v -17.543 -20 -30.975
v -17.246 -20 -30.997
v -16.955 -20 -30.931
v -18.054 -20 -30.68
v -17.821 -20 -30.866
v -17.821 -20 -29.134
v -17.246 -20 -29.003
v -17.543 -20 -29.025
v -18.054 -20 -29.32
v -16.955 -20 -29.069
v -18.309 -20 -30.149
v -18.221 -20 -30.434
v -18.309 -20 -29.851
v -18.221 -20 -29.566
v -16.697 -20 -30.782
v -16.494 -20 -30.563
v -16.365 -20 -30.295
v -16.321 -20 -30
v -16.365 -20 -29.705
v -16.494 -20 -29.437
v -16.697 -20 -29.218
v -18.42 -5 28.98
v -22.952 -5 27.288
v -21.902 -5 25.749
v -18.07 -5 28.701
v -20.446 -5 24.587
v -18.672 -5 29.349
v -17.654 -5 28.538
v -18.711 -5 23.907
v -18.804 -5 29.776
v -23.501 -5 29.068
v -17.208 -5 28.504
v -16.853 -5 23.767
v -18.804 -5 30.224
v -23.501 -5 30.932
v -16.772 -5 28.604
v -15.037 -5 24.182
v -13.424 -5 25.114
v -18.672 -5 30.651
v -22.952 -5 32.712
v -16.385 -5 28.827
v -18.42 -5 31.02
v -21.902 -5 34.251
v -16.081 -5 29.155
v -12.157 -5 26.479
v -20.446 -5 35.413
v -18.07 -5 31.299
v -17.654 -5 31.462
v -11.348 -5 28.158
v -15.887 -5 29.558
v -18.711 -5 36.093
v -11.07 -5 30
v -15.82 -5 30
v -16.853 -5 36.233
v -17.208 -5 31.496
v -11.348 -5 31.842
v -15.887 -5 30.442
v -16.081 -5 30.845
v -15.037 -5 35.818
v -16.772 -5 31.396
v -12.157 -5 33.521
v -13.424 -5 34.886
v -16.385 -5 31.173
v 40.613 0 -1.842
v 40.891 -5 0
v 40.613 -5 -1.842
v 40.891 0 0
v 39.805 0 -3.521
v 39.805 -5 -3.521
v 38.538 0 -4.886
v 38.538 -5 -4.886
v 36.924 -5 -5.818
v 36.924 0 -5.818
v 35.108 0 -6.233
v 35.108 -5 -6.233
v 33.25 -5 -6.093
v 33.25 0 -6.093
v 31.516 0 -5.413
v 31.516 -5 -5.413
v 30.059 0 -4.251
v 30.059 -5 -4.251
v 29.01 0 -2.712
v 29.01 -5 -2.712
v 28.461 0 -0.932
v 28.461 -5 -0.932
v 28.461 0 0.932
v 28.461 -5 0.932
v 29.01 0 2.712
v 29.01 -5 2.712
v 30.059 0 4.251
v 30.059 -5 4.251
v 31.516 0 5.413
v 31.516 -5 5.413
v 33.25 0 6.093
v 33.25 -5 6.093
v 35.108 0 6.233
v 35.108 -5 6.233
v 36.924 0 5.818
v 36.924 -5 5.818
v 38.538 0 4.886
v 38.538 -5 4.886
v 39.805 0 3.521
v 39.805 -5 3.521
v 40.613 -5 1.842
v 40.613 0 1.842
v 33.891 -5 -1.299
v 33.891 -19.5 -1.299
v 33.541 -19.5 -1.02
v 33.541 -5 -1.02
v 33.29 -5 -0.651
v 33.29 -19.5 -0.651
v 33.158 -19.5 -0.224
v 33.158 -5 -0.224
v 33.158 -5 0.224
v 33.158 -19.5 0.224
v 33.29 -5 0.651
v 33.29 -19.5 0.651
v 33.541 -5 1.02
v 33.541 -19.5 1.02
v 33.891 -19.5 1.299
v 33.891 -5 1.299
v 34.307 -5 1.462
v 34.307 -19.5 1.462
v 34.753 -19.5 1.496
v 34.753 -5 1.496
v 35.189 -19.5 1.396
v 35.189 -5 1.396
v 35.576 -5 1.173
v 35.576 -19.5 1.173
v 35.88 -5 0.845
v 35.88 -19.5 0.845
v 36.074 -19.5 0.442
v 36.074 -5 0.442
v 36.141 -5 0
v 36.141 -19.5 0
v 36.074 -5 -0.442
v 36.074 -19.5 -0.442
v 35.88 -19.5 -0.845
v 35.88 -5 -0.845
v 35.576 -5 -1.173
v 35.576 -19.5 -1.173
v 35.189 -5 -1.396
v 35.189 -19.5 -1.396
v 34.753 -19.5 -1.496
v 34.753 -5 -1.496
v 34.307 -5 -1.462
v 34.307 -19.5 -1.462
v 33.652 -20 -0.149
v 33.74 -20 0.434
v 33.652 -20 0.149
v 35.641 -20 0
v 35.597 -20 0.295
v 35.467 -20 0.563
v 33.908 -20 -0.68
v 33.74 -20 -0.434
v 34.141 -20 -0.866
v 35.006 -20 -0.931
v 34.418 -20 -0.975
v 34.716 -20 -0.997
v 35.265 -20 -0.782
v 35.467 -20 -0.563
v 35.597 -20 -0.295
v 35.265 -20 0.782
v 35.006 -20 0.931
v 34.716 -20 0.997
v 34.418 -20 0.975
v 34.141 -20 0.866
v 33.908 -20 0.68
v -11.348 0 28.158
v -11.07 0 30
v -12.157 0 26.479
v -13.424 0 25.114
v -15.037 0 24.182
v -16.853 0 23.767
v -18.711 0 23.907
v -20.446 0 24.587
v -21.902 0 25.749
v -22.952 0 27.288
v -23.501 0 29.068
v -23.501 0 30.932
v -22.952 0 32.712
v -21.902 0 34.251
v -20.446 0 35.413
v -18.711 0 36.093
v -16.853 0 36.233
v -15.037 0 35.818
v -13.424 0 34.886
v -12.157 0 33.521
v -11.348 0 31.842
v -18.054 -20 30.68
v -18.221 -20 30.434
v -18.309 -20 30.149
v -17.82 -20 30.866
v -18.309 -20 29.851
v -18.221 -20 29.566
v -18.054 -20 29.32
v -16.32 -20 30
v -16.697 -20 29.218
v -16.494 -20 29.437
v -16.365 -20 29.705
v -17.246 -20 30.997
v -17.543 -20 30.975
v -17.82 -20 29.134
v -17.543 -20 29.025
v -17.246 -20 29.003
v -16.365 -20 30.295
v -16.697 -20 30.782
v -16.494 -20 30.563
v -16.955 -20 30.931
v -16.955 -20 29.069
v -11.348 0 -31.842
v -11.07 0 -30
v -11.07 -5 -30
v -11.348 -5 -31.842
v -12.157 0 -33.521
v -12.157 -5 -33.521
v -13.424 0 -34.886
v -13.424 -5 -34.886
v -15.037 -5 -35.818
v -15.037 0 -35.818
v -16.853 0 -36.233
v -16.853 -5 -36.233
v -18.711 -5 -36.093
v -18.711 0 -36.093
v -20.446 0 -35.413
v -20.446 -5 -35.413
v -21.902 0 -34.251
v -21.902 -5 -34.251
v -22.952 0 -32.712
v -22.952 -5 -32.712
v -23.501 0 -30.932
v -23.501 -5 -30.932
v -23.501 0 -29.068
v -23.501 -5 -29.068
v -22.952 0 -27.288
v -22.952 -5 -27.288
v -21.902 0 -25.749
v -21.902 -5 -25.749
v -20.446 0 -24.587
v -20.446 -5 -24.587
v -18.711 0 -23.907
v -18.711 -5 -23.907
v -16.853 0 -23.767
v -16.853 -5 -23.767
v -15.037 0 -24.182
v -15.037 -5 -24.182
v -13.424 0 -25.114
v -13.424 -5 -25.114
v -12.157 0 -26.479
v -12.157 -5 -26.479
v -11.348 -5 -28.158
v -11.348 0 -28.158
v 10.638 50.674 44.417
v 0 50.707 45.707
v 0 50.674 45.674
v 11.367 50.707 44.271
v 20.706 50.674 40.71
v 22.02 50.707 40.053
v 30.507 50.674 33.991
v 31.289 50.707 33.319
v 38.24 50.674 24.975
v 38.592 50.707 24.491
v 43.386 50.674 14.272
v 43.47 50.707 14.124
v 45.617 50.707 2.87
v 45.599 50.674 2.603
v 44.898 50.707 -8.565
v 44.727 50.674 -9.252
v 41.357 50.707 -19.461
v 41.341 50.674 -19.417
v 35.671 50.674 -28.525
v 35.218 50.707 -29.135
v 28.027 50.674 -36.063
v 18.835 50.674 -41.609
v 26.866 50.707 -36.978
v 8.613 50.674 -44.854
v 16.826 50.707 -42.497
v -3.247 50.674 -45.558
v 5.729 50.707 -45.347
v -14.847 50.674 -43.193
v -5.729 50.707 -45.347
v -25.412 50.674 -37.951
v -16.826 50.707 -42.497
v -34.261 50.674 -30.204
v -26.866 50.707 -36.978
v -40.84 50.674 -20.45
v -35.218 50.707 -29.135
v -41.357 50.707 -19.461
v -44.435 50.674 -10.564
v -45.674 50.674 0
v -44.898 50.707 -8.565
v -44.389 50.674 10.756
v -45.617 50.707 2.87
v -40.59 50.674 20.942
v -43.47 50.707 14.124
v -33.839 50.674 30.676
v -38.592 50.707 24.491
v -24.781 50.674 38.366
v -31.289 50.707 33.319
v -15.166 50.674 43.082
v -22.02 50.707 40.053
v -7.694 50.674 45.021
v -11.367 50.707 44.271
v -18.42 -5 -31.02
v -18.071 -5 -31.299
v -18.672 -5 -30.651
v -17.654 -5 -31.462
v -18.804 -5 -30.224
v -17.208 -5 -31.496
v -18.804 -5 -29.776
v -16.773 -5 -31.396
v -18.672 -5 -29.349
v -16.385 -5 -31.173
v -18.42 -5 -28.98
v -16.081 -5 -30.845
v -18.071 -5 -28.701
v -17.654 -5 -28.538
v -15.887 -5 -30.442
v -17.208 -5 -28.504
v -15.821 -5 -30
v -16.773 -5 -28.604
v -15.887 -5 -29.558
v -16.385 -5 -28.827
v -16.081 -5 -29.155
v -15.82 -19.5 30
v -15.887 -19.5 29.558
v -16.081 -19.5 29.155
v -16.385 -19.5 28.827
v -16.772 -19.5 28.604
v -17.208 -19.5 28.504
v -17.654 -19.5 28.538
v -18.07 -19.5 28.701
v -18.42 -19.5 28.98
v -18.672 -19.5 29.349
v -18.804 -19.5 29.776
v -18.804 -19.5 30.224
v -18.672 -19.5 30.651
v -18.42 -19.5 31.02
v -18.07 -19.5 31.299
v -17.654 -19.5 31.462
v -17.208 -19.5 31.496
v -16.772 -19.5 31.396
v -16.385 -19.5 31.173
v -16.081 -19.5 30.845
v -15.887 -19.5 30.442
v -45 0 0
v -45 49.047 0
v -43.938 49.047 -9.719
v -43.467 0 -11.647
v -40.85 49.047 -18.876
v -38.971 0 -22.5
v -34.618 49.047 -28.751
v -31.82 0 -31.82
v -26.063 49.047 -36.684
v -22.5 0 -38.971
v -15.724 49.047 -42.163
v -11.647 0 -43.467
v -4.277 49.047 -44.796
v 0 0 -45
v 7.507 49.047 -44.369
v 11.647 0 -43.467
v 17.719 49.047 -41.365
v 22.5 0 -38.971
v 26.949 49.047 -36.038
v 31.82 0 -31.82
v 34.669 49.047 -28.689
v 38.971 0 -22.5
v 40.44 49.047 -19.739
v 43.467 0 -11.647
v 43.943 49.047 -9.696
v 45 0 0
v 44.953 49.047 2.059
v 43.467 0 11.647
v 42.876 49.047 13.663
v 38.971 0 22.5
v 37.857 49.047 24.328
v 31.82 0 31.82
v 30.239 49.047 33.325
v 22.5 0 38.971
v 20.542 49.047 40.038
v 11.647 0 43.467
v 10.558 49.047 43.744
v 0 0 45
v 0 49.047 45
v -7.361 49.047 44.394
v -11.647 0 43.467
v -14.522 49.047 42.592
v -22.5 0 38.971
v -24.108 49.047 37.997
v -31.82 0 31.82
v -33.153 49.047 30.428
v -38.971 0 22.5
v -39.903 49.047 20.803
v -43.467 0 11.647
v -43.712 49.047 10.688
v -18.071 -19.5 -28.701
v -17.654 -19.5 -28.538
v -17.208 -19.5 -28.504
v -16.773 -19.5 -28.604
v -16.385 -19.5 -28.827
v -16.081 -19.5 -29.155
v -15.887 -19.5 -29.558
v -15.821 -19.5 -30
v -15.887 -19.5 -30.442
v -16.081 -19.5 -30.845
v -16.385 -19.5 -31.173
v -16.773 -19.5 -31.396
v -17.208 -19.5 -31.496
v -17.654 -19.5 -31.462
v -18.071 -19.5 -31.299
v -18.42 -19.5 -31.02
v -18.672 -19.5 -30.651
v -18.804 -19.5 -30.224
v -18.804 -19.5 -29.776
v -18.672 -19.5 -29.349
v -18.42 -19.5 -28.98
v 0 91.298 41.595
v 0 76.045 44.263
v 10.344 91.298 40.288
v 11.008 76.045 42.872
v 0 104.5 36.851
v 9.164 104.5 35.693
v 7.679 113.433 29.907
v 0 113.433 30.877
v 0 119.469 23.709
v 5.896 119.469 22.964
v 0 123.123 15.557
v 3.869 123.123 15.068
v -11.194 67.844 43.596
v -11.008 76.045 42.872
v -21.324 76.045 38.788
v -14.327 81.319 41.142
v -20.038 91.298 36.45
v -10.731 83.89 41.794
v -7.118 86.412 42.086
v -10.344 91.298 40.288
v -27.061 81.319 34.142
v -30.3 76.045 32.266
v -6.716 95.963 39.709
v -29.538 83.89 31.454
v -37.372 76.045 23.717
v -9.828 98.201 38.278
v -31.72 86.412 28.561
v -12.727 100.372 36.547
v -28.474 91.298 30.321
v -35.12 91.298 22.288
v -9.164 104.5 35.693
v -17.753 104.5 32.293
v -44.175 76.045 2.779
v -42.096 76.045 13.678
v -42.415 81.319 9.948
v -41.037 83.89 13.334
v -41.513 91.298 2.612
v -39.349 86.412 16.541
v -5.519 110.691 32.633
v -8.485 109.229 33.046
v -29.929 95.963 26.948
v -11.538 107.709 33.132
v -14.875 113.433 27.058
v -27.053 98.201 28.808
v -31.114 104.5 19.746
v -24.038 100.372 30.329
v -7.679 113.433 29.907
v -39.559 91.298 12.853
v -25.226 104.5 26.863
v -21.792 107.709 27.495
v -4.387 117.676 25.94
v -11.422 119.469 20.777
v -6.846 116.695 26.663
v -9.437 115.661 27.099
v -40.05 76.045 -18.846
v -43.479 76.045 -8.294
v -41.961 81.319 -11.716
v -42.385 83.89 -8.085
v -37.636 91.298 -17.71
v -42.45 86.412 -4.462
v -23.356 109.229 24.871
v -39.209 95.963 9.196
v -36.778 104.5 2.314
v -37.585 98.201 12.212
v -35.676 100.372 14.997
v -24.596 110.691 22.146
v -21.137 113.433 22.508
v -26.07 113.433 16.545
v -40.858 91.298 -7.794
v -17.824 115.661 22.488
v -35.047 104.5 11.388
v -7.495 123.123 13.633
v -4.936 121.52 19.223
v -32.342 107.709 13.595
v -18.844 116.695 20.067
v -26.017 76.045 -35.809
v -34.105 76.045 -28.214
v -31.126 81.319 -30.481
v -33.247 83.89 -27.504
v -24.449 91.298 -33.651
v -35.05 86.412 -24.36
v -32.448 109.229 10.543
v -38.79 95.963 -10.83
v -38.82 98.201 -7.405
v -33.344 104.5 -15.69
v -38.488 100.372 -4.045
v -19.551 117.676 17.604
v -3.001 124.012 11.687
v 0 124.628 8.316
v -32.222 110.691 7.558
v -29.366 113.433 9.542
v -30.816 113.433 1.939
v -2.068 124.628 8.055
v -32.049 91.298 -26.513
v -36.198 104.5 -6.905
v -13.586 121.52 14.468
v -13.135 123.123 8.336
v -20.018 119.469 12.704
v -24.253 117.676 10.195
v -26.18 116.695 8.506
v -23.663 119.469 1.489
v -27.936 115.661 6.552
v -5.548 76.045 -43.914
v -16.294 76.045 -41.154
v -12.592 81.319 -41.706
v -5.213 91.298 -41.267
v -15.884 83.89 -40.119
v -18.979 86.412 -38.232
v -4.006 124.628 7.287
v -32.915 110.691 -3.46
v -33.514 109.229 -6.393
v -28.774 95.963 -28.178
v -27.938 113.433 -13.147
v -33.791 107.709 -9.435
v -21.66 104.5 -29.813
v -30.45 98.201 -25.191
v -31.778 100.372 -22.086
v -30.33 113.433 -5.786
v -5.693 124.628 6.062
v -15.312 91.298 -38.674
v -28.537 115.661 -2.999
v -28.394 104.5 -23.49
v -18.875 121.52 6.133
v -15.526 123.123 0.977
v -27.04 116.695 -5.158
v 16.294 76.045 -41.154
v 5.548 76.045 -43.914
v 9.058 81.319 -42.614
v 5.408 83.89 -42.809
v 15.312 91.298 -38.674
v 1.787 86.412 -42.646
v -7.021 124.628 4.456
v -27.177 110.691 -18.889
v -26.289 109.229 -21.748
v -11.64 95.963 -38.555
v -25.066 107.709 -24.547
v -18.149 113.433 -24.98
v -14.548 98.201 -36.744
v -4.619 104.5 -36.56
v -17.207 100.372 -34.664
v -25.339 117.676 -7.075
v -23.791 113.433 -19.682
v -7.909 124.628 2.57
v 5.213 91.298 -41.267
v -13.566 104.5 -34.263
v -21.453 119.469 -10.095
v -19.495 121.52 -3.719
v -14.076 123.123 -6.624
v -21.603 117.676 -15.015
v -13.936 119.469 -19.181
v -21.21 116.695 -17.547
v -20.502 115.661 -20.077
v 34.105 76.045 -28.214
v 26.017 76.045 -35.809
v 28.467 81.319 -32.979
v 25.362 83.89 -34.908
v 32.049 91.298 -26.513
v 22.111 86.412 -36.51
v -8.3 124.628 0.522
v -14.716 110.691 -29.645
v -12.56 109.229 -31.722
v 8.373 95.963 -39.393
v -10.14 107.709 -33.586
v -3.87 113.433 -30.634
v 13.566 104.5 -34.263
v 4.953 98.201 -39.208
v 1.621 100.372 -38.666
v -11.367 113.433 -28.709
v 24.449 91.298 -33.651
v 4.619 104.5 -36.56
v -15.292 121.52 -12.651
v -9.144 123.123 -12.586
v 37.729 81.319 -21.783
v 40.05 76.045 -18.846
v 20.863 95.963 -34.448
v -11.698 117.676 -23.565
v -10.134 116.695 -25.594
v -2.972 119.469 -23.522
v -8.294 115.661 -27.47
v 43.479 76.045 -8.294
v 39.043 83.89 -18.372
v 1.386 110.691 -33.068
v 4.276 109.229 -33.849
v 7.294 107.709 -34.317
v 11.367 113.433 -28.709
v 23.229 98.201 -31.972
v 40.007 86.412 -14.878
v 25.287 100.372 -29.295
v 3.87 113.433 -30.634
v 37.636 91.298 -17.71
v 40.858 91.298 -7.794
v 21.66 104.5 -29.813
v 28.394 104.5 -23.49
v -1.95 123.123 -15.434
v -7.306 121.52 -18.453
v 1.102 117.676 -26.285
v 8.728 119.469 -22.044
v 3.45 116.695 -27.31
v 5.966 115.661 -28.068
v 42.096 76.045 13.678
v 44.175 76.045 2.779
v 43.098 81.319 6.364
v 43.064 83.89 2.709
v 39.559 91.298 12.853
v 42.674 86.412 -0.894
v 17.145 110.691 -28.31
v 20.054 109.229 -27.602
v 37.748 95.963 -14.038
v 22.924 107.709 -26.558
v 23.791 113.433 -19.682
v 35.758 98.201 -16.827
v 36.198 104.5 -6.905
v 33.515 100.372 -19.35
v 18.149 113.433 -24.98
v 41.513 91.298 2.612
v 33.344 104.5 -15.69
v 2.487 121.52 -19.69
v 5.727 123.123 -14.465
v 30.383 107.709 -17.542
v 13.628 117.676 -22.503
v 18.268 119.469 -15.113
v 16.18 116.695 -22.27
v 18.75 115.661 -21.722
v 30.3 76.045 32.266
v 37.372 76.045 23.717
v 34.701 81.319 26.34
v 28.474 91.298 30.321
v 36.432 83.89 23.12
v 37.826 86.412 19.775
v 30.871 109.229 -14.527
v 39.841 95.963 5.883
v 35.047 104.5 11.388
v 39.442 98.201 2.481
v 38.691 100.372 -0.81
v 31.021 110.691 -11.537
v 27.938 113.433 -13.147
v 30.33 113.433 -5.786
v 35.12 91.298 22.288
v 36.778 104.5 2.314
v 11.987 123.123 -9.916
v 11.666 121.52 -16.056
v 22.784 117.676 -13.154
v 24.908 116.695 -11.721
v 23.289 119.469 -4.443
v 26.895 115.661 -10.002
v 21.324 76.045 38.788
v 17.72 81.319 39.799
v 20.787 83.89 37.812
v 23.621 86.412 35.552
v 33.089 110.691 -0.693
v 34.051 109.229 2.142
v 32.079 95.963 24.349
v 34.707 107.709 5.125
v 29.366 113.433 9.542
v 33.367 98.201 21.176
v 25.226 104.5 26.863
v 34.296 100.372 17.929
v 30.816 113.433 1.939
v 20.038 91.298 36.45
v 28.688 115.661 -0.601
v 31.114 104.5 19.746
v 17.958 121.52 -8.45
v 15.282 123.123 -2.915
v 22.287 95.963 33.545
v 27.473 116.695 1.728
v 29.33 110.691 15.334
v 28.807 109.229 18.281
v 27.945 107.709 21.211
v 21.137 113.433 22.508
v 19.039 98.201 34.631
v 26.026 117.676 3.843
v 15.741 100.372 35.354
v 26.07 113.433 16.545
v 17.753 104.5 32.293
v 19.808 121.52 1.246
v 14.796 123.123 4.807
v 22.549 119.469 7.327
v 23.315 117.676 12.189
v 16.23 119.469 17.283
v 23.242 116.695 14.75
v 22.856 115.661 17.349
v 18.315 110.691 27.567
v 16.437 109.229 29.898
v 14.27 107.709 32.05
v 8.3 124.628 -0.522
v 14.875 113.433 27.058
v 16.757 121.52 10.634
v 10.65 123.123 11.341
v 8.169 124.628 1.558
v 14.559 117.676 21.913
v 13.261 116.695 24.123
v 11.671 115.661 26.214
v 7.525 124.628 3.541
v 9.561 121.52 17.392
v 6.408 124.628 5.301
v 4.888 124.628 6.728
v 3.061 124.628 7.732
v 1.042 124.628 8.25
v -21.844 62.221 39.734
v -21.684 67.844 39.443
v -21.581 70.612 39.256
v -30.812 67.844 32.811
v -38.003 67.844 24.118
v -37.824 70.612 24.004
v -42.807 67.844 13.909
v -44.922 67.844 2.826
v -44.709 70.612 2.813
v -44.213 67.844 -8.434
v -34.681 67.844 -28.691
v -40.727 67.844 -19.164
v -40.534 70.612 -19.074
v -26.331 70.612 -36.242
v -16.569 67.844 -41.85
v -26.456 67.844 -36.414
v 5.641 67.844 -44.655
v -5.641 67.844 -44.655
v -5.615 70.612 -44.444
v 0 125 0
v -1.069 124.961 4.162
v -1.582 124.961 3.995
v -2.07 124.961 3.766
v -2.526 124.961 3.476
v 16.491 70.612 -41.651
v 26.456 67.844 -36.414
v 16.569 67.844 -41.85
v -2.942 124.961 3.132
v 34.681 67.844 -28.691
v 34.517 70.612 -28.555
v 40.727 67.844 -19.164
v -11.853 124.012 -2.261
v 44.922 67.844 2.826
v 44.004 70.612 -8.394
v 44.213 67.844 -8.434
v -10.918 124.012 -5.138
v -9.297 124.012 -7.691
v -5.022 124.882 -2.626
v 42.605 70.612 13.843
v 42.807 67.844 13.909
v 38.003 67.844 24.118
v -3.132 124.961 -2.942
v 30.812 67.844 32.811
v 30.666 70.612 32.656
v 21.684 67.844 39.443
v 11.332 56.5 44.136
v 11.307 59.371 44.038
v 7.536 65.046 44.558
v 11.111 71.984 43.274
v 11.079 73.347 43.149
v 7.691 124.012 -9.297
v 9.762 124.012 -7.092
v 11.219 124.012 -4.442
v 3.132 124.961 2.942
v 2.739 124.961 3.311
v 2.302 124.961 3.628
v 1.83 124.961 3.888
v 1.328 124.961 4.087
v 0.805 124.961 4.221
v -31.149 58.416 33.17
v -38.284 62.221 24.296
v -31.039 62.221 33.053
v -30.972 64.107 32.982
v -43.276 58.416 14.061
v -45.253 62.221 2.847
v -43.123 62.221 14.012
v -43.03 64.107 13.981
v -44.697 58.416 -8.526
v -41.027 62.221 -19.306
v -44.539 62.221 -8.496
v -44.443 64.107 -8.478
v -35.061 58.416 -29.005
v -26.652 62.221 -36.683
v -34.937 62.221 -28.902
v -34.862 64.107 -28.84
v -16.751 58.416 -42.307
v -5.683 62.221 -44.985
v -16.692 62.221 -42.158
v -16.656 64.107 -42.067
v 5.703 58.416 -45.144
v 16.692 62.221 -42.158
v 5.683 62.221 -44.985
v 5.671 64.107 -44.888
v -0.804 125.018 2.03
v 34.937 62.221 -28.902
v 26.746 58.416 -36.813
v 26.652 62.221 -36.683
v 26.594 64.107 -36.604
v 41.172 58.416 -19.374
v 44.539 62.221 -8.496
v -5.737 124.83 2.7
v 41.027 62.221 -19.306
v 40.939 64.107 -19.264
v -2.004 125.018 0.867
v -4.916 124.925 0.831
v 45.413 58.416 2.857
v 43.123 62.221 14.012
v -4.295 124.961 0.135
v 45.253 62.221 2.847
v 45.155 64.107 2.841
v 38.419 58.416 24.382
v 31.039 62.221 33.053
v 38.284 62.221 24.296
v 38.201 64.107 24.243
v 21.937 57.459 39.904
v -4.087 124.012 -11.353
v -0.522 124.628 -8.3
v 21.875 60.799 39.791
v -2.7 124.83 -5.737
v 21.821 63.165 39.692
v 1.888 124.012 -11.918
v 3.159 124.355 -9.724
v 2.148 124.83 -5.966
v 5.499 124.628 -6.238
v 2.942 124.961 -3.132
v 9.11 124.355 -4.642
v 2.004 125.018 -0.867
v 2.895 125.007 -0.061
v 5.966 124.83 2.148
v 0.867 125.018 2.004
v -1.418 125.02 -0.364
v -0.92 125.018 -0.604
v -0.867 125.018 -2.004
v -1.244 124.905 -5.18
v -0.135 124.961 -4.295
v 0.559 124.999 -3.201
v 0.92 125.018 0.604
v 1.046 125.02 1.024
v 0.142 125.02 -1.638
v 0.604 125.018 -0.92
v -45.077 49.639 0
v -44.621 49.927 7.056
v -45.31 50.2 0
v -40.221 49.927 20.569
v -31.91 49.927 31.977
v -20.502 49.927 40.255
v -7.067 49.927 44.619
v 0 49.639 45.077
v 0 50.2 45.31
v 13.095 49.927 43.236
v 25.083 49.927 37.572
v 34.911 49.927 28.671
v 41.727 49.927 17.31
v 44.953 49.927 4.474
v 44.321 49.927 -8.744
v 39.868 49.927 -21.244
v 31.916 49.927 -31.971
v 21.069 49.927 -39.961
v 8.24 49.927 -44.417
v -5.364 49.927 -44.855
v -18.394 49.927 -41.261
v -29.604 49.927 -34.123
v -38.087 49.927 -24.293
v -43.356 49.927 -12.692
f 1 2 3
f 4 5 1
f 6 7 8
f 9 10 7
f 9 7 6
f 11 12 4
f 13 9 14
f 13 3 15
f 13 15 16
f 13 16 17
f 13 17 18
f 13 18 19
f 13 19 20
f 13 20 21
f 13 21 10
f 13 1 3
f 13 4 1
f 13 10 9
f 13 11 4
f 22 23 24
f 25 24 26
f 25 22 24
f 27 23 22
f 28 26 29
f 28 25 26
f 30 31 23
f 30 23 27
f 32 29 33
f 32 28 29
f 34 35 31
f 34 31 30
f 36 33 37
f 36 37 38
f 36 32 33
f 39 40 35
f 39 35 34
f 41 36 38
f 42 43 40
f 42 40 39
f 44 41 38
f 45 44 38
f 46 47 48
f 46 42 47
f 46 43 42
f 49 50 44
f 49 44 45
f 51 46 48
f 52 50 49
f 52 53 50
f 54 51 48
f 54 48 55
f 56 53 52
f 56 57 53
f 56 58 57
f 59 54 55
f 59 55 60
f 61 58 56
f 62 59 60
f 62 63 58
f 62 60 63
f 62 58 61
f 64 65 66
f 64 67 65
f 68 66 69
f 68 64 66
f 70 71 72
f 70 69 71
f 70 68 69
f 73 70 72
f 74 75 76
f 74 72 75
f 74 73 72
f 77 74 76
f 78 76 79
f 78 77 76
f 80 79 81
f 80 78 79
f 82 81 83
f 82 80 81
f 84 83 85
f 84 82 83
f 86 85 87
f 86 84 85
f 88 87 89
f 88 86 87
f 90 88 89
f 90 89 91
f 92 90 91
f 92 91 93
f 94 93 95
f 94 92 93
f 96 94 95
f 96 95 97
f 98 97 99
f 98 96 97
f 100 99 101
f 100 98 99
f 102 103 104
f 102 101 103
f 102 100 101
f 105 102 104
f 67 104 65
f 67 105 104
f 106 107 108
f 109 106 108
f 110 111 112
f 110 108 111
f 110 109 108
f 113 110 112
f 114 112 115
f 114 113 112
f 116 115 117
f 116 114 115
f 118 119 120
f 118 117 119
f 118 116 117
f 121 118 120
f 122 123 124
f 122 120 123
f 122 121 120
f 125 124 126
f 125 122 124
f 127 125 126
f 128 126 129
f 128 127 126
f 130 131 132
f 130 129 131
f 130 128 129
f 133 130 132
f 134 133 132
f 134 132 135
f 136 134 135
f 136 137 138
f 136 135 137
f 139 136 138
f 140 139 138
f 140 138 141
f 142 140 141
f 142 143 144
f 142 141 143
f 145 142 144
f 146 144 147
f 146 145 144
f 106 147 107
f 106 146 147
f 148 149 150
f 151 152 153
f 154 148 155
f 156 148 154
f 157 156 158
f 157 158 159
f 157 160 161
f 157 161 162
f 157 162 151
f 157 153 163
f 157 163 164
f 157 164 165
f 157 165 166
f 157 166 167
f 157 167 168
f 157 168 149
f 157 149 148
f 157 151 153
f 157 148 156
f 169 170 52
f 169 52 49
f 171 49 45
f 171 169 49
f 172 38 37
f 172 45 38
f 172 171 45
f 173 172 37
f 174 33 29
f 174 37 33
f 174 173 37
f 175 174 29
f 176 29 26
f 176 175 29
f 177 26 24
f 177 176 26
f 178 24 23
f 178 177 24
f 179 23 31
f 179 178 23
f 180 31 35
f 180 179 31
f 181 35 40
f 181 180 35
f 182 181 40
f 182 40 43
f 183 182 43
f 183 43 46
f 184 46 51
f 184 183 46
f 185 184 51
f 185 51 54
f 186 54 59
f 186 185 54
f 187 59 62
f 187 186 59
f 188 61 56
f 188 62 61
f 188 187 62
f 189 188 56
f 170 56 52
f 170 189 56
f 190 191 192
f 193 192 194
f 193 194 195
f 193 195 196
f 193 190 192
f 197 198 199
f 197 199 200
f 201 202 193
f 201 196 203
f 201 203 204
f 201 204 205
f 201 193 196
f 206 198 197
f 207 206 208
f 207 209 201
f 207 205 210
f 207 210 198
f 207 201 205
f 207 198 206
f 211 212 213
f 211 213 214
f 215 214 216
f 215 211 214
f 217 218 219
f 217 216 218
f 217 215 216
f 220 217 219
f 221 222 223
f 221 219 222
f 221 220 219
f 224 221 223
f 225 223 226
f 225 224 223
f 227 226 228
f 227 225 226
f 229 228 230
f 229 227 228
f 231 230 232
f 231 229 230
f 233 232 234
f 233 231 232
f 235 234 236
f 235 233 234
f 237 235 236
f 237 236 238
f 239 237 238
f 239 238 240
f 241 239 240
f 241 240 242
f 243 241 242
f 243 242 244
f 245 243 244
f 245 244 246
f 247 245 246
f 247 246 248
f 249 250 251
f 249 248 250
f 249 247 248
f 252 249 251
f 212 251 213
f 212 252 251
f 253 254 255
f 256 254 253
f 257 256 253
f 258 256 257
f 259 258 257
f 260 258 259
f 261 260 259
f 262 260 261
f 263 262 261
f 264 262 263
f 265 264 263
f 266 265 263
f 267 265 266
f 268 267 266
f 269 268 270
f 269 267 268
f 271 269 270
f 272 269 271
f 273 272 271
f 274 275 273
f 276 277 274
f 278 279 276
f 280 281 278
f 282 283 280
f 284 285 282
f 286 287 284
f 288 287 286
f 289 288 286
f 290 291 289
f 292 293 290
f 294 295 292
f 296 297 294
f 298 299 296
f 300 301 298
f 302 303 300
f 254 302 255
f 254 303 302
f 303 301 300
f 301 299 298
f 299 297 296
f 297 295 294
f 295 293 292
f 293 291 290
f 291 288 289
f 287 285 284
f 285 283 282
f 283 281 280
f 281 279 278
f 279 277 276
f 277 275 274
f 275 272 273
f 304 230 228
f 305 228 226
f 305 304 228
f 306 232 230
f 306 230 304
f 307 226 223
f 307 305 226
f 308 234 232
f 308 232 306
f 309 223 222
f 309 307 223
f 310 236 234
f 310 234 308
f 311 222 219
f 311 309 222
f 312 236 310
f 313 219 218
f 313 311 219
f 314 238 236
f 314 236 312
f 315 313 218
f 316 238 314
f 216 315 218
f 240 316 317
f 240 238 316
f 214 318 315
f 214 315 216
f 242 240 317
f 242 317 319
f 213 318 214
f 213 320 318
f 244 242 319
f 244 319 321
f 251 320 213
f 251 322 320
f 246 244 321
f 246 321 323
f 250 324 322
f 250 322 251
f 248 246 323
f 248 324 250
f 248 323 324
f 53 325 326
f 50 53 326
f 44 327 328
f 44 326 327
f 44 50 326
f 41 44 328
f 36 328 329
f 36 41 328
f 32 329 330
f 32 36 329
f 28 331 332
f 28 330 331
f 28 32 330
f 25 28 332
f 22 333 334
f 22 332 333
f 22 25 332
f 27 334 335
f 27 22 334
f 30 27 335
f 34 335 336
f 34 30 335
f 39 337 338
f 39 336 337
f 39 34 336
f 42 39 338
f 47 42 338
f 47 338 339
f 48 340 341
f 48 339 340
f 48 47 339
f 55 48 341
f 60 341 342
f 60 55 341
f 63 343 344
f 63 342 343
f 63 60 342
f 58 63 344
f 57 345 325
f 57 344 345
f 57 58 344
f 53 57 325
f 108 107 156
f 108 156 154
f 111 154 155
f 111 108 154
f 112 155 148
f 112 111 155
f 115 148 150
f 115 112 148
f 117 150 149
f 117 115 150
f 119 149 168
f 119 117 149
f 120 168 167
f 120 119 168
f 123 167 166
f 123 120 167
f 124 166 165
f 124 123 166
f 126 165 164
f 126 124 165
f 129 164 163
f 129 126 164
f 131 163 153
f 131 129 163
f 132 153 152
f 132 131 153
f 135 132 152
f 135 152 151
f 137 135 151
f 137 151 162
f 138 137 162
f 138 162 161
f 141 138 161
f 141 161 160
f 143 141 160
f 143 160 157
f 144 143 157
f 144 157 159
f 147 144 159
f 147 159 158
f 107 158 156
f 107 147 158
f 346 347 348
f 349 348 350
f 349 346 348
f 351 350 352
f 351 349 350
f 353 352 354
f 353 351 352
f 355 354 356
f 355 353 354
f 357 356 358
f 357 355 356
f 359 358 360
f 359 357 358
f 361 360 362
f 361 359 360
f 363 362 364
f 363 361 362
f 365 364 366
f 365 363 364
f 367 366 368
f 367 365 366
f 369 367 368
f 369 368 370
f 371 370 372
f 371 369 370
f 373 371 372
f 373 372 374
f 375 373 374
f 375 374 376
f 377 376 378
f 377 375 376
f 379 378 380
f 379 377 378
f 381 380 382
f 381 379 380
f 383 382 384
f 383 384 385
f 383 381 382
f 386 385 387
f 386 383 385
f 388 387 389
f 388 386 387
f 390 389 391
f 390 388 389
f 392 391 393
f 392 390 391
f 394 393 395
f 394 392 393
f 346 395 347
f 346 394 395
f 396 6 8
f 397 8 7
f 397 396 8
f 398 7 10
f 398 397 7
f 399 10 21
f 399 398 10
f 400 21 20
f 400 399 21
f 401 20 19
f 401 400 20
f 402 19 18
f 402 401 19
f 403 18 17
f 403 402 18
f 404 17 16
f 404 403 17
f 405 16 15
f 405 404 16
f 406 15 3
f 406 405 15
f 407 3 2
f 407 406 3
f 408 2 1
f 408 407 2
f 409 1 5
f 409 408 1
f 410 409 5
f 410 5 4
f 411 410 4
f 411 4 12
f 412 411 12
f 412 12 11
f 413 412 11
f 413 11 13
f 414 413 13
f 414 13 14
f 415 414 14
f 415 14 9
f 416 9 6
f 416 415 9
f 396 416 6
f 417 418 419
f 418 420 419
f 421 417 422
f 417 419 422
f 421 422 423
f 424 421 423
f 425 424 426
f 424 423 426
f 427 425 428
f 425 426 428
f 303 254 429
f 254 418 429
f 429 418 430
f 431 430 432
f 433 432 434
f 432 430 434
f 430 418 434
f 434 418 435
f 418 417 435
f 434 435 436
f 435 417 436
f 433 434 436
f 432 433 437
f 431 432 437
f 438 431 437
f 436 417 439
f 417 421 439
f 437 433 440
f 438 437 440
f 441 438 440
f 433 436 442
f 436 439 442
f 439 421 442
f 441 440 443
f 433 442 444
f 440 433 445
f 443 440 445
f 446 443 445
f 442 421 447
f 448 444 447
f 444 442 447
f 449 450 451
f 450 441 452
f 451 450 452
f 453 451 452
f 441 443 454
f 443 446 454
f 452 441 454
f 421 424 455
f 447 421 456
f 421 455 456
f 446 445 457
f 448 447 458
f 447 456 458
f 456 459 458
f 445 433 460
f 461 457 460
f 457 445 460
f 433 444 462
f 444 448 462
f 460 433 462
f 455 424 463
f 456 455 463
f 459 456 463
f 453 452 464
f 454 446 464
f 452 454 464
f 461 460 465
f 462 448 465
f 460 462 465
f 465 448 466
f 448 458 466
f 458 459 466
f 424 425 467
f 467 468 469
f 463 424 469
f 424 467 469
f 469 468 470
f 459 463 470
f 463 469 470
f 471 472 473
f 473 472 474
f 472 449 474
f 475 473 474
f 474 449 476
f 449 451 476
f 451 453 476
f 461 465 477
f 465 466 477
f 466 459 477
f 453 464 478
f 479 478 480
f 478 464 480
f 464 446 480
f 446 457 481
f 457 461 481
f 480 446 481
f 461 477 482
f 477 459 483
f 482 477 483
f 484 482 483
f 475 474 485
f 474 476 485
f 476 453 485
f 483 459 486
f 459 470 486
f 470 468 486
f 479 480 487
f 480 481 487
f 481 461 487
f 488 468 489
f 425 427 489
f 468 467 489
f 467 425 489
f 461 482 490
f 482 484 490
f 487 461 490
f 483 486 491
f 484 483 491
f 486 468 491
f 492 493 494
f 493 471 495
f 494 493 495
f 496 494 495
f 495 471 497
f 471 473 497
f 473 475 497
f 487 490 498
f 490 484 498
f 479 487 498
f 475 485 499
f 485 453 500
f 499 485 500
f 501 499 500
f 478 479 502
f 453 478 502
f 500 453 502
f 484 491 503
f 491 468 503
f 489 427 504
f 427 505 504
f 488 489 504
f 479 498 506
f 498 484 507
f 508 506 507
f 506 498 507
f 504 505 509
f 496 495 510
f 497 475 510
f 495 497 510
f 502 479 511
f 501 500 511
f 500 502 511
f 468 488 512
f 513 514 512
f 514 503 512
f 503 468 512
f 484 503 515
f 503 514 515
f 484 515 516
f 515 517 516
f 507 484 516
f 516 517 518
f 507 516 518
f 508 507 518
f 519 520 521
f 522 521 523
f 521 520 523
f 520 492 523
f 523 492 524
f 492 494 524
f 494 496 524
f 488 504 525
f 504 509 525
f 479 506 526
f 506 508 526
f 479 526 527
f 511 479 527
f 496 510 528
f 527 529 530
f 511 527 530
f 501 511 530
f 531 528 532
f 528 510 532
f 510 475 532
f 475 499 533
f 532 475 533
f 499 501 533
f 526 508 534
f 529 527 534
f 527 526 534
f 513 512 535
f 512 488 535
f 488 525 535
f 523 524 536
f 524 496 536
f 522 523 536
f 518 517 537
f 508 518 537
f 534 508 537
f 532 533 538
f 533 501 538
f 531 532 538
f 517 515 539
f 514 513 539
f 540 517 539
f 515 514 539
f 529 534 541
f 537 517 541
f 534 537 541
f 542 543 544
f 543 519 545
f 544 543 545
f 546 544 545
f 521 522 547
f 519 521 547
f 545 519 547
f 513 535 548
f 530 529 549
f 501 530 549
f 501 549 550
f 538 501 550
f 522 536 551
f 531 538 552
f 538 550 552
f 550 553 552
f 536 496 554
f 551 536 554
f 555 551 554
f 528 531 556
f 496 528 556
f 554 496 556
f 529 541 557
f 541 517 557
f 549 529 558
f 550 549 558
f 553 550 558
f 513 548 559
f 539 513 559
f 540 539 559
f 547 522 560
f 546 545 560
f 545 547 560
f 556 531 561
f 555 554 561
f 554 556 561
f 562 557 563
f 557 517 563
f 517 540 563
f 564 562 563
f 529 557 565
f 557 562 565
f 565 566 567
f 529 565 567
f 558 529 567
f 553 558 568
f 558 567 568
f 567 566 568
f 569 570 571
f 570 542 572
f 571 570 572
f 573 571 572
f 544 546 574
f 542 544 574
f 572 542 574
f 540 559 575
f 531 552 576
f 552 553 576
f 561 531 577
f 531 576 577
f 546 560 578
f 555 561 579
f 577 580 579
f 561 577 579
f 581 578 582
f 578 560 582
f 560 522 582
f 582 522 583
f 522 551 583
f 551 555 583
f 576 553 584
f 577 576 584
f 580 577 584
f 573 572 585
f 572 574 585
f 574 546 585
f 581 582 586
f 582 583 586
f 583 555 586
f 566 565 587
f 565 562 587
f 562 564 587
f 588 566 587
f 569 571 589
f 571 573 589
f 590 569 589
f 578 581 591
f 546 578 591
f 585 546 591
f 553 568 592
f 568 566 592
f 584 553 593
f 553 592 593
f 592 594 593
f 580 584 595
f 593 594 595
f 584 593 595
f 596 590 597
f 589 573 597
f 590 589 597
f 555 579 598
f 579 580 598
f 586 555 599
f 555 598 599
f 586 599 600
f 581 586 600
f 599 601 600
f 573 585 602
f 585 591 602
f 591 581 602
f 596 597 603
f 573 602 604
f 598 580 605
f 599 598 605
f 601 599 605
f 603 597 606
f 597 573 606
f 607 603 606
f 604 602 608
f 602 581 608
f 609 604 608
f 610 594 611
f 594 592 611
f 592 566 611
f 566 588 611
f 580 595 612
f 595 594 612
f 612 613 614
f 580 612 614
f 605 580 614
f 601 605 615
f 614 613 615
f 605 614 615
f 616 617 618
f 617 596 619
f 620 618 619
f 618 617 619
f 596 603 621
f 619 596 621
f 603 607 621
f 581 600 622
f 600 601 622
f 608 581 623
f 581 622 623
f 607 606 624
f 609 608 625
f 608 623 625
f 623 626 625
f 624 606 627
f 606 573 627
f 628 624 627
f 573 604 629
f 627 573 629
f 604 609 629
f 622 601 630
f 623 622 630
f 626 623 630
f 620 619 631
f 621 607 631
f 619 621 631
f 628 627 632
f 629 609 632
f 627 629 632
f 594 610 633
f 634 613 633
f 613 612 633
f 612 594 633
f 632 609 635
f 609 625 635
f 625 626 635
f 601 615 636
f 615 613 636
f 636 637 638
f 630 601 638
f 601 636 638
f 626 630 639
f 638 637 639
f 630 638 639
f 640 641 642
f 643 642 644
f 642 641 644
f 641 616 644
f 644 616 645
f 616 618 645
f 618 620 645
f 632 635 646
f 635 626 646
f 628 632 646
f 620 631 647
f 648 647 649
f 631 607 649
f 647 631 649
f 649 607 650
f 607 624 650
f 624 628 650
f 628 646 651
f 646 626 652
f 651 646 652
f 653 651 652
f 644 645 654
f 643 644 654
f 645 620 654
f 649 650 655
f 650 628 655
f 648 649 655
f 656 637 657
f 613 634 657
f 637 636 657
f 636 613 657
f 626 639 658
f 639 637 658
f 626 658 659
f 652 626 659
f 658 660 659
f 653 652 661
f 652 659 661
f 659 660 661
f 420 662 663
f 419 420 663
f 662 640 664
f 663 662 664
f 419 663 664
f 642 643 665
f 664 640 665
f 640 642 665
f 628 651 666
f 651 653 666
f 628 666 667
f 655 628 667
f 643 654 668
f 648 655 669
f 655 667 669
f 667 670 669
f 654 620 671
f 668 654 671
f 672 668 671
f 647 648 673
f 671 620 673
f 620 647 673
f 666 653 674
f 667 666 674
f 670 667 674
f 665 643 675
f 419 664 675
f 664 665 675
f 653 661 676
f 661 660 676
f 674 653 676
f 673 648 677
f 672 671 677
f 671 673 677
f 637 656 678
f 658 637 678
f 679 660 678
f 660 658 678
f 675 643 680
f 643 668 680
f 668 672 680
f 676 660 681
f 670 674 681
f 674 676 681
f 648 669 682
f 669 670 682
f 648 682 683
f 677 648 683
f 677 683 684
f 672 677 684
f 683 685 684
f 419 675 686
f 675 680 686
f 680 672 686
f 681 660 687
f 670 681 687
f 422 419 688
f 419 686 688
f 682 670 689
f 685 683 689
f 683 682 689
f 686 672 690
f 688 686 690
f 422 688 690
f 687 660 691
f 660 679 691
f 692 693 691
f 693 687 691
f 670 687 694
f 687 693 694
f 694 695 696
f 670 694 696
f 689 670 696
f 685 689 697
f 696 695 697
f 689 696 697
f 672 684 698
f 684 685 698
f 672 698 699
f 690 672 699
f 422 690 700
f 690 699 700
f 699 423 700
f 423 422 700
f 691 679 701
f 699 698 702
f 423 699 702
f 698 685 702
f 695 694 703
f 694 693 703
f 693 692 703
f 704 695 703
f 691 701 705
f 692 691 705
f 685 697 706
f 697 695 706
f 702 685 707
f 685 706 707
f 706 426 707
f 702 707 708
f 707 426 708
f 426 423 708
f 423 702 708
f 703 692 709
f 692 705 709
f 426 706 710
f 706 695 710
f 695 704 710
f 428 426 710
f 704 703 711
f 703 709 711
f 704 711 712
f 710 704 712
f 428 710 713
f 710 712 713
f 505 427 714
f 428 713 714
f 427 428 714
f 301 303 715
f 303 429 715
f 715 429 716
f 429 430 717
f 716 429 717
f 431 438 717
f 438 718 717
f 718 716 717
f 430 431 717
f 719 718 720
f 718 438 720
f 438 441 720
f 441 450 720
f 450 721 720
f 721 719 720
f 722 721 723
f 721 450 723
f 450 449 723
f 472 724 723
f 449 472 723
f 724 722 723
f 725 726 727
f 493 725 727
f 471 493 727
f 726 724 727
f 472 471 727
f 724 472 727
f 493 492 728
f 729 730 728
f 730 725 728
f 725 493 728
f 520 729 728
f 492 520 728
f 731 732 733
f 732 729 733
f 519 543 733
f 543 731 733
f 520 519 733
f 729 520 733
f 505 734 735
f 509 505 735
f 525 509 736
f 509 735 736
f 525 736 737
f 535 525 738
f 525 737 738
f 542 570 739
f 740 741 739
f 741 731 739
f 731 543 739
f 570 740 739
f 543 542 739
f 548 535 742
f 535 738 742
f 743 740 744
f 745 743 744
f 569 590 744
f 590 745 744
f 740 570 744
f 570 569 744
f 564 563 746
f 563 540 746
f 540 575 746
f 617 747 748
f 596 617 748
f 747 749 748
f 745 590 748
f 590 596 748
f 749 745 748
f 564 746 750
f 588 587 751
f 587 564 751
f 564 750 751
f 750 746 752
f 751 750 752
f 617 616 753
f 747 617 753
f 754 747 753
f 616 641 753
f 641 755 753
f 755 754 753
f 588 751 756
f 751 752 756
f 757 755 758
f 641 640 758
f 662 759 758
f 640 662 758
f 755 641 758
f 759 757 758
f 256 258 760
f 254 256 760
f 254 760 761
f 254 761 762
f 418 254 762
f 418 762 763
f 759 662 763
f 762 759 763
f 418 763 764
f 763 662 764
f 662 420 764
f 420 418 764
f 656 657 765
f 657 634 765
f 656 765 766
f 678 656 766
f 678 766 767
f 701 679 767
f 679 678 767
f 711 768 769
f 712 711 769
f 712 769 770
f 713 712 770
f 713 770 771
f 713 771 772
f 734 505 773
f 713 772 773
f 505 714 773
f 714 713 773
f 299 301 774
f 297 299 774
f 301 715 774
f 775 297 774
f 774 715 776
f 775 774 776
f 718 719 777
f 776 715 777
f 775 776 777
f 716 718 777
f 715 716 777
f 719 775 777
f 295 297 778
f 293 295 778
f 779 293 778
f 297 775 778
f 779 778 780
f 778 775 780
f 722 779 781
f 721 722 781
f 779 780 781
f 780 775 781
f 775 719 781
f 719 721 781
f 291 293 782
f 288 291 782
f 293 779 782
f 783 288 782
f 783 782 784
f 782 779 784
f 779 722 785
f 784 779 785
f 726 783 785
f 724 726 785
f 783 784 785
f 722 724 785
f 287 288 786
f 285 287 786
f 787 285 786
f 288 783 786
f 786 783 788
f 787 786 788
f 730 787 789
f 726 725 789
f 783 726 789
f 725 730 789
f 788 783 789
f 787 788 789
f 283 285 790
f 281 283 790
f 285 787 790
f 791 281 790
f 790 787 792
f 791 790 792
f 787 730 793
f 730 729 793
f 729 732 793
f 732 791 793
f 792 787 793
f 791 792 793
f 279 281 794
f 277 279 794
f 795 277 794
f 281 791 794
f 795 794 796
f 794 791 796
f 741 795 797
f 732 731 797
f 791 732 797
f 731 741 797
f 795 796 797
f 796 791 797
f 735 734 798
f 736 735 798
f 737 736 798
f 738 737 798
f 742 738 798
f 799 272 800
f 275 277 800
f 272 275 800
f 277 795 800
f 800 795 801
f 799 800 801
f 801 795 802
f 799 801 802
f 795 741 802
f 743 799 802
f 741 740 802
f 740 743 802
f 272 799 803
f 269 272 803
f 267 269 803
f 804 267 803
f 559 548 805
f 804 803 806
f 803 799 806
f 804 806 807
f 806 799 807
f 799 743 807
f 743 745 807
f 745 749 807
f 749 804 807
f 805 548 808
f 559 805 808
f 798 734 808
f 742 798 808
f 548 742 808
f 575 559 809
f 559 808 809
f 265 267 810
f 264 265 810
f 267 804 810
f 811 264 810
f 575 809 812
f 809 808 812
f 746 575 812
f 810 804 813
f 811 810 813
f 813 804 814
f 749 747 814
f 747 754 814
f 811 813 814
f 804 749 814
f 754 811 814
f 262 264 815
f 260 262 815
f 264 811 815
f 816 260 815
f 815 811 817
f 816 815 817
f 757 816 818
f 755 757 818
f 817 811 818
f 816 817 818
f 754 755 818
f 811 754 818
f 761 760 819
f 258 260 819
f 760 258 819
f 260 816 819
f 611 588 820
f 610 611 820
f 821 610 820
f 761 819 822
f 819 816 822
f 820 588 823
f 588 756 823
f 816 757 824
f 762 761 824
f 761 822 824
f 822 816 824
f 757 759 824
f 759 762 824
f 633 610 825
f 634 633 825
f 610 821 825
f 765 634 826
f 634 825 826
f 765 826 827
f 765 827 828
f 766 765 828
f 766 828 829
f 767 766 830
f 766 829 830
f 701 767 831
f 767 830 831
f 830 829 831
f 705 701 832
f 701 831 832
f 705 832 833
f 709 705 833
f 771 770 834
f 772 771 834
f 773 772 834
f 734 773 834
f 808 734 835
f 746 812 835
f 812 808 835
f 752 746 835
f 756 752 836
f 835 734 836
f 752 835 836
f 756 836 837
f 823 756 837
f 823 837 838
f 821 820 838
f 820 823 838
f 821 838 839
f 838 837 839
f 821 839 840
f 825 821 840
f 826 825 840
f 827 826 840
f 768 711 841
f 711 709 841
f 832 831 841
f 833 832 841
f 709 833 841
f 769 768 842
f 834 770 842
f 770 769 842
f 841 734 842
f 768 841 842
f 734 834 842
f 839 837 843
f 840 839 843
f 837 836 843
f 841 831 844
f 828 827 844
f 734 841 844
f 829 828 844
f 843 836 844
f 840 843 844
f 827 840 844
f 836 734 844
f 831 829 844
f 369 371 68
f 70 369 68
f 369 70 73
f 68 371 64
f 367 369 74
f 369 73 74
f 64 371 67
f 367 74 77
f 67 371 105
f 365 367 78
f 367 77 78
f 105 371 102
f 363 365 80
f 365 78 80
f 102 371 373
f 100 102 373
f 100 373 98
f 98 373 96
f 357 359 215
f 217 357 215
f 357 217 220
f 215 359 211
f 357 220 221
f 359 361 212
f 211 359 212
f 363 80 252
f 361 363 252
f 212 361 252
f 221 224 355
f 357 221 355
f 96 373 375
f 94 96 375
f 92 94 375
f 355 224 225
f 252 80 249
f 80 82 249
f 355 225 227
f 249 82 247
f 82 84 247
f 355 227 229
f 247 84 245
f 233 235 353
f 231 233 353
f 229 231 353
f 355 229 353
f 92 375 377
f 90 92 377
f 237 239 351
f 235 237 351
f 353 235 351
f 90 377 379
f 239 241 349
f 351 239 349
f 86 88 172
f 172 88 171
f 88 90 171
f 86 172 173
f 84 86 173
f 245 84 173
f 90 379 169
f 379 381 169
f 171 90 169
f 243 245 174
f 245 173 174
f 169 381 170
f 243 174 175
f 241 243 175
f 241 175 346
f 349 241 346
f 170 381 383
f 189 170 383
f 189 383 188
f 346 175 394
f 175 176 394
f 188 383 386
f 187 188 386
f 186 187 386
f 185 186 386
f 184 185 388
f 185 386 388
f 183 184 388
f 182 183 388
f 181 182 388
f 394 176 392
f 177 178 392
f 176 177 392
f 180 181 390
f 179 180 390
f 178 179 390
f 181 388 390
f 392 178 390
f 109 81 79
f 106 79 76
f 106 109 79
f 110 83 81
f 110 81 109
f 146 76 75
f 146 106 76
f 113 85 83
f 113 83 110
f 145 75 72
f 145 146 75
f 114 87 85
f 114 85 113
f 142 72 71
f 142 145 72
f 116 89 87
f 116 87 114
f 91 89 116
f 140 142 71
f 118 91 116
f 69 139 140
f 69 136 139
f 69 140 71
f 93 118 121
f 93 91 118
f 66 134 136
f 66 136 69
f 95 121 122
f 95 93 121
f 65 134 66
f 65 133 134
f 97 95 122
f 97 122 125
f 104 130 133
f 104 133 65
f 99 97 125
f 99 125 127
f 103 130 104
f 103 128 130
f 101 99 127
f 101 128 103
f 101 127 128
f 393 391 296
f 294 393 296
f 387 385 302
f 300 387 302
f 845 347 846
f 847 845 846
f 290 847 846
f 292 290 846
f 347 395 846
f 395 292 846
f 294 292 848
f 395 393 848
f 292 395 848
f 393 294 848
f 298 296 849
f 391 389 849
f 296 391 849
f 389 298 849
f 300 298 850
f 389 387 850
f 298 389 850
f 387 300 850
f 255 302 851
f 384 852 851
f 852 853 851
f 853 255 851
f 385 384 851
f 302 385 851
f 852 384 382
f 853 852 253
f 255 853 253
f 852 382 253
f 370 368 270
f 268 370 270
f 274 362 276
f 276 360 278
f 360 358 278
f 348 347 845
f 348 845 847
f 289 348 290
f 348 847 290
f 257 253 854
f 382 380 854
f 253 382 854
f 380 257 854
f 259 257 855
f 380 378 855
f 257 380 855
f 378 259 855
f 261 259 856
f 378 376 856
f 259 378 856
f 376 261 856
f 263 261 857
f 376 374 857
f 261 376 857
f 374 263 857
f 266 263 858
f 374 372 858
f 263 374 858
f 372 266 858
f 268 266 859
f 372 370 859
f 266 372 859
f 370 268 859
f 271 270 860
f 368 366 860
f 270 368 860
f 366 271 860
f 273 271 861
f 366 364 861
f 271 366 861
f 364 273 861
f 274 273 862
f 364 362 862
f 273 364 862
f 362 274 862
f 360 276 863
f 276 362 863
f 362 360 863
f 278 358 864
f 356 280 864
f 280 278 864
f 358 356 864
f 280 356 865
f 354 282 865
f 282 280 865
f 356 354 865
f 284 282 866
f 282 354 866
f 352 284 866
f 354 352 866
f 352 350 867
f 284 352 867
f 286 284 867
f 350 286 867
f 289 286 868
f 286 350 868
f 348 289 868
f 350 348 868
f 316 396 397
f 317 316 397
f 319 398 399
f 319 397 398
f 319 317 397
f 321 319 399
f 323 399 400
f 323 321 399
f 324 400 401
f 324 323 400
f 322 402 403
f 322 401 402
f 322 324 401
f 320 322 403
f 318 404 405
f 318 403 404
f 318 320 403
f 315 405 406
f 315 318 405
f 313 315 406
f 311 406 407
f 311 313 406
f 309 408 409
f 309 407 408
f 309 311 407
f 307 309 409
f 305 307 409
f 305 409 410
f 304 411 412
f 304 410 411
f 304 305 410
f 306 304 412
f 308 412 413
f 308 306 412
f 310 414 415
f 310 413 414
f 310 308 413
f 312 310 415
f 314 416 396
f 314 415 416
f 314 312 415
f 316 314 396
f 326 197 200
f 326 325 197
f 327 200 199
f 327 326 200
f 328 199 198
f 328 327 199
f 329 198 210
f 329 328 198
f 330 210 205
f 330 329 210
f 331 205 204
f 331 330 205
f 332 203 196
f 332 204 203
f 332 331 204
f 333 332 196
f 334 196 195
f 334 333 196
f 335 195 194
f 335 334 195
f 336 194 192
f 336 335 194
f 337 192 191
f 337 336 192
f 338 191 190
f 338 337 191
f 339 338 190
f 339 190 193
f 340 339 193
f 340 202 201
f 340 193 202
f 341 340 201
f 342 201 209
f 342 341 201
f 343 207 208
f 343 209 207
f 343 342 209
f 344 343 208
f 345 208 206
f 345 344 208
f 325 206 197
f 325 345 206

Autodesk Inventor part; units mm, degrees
ref_plane "YZ Plane" through (0, 0, 0) normal (1, 0, 0) x (0, 1, 0)
ref_plane "XZ Plane" through (0, 0, 0) normal (0, 1, 0) x (-1, 0, 0)
ref_plane "XY Plane" through (0, 0, 0) normal (0, 0, 1) x (1, 0, 0)
sketch "Sketch1" plane through (0, 0, 0) normal (0, 1, 0) x (-1, 0, 0)
  circle A0 centre (0, 0) radius 45
  dimension "d0" = 90
extrude "Extrusion1" add sketch "Sketch1" along normal blind 50
sketch "Sketch2" plane through (0, 0, 0) normal (1, 0, 0) x (0, 1, 0)
  line L0 (50, -45) -> (50, 45) projected
  line L1 (50, 45) -> (50.7071, 45.7071)
  line L2 (50.7071, 45.7071) -> (90, 45) construction
  line L3 (90, 45) -> (126, 40) construction
  line L4 (126, 40) -> (125, 0) construction
  spline S0 degree 3 poles (50.7071, 45.7071) (90, 45) (126, 40) (125, 0) knots 1 1 1 1 2 2 2 2
  line L5 (125, 0) -> (50, 0)
  line L6 (50, 0) -> (50, 45)
  point P0 (0, 0)
  dimension "d3" = 1
  dimension "d4" = 135
  dimension "d5" = 40
  dimension "d6" = 76
  dimension "d7" = 75
  dimension "d8" = 40
  dimension "d9" = 45
revolve "Revolution1" add sketch "Sketch2" angle 360 about axis through (0, 125, 0) along (0, -1, 0)
fillet "Fillet1" radius 2.3 2 edges at (31.8198, 50, -31.8198) (-31.8198, 50, 31.8198)
sketch "Sketch3" plane through (0, 0, 0) normal (0, -1, 0) x (1, 0, 0)
  line L0 (34.641, 0) -> (-17.3205, 30) construction
  line L1 (-17.3205, 30) -> (-17.3205, -30) construction
  line L2 (-17.3205, -30) -> (34.641, 0) construction
  circle A0 centre (0, 0) radius 34.641 construction
  circle A1 centre (-17.3205, 30) radius 6.25
  circle A2 centre (34.641, 0) radius 6.25
  circle A3 centre (-17.3205, -30) radius 6.25
  point P0 (-17.3205, 0)
  dimension "d12" = 60
  dimension "d13" = 12.5
extrude "Extrusion2" add sketch "Sketch3" along normal blind 5
sketch "Sketch4" plane through (-17.3205, -5, 30) normal (0, -1, 0) x (1, 0, 0)
  circle A0 centre (0, 0) radius 6.25 projected
  circle A1 centre (0, 0) radius 1.5
  point P0 (17.3205, -30)
  dimension "d16" = 3
extrude "Extrusion3" add sketch "Sketch4" along normal blind 15 contours A1
chamfer "Chamfer1" distance 0.5 angle 45 1 edges at (-18.8205, -20, 30)
thread "Thread1" size "M3x0.5" class "6g" standard "ISO Metric profile" full length
pattern_circular "Circular Pattern1" count 3 over 360 about axis through (0, 0, 0) along (0, 1, 0) of "Extrusion3", "Chamfer1"
properties part number "Circulina" material "Steel, Mild, Welded"
